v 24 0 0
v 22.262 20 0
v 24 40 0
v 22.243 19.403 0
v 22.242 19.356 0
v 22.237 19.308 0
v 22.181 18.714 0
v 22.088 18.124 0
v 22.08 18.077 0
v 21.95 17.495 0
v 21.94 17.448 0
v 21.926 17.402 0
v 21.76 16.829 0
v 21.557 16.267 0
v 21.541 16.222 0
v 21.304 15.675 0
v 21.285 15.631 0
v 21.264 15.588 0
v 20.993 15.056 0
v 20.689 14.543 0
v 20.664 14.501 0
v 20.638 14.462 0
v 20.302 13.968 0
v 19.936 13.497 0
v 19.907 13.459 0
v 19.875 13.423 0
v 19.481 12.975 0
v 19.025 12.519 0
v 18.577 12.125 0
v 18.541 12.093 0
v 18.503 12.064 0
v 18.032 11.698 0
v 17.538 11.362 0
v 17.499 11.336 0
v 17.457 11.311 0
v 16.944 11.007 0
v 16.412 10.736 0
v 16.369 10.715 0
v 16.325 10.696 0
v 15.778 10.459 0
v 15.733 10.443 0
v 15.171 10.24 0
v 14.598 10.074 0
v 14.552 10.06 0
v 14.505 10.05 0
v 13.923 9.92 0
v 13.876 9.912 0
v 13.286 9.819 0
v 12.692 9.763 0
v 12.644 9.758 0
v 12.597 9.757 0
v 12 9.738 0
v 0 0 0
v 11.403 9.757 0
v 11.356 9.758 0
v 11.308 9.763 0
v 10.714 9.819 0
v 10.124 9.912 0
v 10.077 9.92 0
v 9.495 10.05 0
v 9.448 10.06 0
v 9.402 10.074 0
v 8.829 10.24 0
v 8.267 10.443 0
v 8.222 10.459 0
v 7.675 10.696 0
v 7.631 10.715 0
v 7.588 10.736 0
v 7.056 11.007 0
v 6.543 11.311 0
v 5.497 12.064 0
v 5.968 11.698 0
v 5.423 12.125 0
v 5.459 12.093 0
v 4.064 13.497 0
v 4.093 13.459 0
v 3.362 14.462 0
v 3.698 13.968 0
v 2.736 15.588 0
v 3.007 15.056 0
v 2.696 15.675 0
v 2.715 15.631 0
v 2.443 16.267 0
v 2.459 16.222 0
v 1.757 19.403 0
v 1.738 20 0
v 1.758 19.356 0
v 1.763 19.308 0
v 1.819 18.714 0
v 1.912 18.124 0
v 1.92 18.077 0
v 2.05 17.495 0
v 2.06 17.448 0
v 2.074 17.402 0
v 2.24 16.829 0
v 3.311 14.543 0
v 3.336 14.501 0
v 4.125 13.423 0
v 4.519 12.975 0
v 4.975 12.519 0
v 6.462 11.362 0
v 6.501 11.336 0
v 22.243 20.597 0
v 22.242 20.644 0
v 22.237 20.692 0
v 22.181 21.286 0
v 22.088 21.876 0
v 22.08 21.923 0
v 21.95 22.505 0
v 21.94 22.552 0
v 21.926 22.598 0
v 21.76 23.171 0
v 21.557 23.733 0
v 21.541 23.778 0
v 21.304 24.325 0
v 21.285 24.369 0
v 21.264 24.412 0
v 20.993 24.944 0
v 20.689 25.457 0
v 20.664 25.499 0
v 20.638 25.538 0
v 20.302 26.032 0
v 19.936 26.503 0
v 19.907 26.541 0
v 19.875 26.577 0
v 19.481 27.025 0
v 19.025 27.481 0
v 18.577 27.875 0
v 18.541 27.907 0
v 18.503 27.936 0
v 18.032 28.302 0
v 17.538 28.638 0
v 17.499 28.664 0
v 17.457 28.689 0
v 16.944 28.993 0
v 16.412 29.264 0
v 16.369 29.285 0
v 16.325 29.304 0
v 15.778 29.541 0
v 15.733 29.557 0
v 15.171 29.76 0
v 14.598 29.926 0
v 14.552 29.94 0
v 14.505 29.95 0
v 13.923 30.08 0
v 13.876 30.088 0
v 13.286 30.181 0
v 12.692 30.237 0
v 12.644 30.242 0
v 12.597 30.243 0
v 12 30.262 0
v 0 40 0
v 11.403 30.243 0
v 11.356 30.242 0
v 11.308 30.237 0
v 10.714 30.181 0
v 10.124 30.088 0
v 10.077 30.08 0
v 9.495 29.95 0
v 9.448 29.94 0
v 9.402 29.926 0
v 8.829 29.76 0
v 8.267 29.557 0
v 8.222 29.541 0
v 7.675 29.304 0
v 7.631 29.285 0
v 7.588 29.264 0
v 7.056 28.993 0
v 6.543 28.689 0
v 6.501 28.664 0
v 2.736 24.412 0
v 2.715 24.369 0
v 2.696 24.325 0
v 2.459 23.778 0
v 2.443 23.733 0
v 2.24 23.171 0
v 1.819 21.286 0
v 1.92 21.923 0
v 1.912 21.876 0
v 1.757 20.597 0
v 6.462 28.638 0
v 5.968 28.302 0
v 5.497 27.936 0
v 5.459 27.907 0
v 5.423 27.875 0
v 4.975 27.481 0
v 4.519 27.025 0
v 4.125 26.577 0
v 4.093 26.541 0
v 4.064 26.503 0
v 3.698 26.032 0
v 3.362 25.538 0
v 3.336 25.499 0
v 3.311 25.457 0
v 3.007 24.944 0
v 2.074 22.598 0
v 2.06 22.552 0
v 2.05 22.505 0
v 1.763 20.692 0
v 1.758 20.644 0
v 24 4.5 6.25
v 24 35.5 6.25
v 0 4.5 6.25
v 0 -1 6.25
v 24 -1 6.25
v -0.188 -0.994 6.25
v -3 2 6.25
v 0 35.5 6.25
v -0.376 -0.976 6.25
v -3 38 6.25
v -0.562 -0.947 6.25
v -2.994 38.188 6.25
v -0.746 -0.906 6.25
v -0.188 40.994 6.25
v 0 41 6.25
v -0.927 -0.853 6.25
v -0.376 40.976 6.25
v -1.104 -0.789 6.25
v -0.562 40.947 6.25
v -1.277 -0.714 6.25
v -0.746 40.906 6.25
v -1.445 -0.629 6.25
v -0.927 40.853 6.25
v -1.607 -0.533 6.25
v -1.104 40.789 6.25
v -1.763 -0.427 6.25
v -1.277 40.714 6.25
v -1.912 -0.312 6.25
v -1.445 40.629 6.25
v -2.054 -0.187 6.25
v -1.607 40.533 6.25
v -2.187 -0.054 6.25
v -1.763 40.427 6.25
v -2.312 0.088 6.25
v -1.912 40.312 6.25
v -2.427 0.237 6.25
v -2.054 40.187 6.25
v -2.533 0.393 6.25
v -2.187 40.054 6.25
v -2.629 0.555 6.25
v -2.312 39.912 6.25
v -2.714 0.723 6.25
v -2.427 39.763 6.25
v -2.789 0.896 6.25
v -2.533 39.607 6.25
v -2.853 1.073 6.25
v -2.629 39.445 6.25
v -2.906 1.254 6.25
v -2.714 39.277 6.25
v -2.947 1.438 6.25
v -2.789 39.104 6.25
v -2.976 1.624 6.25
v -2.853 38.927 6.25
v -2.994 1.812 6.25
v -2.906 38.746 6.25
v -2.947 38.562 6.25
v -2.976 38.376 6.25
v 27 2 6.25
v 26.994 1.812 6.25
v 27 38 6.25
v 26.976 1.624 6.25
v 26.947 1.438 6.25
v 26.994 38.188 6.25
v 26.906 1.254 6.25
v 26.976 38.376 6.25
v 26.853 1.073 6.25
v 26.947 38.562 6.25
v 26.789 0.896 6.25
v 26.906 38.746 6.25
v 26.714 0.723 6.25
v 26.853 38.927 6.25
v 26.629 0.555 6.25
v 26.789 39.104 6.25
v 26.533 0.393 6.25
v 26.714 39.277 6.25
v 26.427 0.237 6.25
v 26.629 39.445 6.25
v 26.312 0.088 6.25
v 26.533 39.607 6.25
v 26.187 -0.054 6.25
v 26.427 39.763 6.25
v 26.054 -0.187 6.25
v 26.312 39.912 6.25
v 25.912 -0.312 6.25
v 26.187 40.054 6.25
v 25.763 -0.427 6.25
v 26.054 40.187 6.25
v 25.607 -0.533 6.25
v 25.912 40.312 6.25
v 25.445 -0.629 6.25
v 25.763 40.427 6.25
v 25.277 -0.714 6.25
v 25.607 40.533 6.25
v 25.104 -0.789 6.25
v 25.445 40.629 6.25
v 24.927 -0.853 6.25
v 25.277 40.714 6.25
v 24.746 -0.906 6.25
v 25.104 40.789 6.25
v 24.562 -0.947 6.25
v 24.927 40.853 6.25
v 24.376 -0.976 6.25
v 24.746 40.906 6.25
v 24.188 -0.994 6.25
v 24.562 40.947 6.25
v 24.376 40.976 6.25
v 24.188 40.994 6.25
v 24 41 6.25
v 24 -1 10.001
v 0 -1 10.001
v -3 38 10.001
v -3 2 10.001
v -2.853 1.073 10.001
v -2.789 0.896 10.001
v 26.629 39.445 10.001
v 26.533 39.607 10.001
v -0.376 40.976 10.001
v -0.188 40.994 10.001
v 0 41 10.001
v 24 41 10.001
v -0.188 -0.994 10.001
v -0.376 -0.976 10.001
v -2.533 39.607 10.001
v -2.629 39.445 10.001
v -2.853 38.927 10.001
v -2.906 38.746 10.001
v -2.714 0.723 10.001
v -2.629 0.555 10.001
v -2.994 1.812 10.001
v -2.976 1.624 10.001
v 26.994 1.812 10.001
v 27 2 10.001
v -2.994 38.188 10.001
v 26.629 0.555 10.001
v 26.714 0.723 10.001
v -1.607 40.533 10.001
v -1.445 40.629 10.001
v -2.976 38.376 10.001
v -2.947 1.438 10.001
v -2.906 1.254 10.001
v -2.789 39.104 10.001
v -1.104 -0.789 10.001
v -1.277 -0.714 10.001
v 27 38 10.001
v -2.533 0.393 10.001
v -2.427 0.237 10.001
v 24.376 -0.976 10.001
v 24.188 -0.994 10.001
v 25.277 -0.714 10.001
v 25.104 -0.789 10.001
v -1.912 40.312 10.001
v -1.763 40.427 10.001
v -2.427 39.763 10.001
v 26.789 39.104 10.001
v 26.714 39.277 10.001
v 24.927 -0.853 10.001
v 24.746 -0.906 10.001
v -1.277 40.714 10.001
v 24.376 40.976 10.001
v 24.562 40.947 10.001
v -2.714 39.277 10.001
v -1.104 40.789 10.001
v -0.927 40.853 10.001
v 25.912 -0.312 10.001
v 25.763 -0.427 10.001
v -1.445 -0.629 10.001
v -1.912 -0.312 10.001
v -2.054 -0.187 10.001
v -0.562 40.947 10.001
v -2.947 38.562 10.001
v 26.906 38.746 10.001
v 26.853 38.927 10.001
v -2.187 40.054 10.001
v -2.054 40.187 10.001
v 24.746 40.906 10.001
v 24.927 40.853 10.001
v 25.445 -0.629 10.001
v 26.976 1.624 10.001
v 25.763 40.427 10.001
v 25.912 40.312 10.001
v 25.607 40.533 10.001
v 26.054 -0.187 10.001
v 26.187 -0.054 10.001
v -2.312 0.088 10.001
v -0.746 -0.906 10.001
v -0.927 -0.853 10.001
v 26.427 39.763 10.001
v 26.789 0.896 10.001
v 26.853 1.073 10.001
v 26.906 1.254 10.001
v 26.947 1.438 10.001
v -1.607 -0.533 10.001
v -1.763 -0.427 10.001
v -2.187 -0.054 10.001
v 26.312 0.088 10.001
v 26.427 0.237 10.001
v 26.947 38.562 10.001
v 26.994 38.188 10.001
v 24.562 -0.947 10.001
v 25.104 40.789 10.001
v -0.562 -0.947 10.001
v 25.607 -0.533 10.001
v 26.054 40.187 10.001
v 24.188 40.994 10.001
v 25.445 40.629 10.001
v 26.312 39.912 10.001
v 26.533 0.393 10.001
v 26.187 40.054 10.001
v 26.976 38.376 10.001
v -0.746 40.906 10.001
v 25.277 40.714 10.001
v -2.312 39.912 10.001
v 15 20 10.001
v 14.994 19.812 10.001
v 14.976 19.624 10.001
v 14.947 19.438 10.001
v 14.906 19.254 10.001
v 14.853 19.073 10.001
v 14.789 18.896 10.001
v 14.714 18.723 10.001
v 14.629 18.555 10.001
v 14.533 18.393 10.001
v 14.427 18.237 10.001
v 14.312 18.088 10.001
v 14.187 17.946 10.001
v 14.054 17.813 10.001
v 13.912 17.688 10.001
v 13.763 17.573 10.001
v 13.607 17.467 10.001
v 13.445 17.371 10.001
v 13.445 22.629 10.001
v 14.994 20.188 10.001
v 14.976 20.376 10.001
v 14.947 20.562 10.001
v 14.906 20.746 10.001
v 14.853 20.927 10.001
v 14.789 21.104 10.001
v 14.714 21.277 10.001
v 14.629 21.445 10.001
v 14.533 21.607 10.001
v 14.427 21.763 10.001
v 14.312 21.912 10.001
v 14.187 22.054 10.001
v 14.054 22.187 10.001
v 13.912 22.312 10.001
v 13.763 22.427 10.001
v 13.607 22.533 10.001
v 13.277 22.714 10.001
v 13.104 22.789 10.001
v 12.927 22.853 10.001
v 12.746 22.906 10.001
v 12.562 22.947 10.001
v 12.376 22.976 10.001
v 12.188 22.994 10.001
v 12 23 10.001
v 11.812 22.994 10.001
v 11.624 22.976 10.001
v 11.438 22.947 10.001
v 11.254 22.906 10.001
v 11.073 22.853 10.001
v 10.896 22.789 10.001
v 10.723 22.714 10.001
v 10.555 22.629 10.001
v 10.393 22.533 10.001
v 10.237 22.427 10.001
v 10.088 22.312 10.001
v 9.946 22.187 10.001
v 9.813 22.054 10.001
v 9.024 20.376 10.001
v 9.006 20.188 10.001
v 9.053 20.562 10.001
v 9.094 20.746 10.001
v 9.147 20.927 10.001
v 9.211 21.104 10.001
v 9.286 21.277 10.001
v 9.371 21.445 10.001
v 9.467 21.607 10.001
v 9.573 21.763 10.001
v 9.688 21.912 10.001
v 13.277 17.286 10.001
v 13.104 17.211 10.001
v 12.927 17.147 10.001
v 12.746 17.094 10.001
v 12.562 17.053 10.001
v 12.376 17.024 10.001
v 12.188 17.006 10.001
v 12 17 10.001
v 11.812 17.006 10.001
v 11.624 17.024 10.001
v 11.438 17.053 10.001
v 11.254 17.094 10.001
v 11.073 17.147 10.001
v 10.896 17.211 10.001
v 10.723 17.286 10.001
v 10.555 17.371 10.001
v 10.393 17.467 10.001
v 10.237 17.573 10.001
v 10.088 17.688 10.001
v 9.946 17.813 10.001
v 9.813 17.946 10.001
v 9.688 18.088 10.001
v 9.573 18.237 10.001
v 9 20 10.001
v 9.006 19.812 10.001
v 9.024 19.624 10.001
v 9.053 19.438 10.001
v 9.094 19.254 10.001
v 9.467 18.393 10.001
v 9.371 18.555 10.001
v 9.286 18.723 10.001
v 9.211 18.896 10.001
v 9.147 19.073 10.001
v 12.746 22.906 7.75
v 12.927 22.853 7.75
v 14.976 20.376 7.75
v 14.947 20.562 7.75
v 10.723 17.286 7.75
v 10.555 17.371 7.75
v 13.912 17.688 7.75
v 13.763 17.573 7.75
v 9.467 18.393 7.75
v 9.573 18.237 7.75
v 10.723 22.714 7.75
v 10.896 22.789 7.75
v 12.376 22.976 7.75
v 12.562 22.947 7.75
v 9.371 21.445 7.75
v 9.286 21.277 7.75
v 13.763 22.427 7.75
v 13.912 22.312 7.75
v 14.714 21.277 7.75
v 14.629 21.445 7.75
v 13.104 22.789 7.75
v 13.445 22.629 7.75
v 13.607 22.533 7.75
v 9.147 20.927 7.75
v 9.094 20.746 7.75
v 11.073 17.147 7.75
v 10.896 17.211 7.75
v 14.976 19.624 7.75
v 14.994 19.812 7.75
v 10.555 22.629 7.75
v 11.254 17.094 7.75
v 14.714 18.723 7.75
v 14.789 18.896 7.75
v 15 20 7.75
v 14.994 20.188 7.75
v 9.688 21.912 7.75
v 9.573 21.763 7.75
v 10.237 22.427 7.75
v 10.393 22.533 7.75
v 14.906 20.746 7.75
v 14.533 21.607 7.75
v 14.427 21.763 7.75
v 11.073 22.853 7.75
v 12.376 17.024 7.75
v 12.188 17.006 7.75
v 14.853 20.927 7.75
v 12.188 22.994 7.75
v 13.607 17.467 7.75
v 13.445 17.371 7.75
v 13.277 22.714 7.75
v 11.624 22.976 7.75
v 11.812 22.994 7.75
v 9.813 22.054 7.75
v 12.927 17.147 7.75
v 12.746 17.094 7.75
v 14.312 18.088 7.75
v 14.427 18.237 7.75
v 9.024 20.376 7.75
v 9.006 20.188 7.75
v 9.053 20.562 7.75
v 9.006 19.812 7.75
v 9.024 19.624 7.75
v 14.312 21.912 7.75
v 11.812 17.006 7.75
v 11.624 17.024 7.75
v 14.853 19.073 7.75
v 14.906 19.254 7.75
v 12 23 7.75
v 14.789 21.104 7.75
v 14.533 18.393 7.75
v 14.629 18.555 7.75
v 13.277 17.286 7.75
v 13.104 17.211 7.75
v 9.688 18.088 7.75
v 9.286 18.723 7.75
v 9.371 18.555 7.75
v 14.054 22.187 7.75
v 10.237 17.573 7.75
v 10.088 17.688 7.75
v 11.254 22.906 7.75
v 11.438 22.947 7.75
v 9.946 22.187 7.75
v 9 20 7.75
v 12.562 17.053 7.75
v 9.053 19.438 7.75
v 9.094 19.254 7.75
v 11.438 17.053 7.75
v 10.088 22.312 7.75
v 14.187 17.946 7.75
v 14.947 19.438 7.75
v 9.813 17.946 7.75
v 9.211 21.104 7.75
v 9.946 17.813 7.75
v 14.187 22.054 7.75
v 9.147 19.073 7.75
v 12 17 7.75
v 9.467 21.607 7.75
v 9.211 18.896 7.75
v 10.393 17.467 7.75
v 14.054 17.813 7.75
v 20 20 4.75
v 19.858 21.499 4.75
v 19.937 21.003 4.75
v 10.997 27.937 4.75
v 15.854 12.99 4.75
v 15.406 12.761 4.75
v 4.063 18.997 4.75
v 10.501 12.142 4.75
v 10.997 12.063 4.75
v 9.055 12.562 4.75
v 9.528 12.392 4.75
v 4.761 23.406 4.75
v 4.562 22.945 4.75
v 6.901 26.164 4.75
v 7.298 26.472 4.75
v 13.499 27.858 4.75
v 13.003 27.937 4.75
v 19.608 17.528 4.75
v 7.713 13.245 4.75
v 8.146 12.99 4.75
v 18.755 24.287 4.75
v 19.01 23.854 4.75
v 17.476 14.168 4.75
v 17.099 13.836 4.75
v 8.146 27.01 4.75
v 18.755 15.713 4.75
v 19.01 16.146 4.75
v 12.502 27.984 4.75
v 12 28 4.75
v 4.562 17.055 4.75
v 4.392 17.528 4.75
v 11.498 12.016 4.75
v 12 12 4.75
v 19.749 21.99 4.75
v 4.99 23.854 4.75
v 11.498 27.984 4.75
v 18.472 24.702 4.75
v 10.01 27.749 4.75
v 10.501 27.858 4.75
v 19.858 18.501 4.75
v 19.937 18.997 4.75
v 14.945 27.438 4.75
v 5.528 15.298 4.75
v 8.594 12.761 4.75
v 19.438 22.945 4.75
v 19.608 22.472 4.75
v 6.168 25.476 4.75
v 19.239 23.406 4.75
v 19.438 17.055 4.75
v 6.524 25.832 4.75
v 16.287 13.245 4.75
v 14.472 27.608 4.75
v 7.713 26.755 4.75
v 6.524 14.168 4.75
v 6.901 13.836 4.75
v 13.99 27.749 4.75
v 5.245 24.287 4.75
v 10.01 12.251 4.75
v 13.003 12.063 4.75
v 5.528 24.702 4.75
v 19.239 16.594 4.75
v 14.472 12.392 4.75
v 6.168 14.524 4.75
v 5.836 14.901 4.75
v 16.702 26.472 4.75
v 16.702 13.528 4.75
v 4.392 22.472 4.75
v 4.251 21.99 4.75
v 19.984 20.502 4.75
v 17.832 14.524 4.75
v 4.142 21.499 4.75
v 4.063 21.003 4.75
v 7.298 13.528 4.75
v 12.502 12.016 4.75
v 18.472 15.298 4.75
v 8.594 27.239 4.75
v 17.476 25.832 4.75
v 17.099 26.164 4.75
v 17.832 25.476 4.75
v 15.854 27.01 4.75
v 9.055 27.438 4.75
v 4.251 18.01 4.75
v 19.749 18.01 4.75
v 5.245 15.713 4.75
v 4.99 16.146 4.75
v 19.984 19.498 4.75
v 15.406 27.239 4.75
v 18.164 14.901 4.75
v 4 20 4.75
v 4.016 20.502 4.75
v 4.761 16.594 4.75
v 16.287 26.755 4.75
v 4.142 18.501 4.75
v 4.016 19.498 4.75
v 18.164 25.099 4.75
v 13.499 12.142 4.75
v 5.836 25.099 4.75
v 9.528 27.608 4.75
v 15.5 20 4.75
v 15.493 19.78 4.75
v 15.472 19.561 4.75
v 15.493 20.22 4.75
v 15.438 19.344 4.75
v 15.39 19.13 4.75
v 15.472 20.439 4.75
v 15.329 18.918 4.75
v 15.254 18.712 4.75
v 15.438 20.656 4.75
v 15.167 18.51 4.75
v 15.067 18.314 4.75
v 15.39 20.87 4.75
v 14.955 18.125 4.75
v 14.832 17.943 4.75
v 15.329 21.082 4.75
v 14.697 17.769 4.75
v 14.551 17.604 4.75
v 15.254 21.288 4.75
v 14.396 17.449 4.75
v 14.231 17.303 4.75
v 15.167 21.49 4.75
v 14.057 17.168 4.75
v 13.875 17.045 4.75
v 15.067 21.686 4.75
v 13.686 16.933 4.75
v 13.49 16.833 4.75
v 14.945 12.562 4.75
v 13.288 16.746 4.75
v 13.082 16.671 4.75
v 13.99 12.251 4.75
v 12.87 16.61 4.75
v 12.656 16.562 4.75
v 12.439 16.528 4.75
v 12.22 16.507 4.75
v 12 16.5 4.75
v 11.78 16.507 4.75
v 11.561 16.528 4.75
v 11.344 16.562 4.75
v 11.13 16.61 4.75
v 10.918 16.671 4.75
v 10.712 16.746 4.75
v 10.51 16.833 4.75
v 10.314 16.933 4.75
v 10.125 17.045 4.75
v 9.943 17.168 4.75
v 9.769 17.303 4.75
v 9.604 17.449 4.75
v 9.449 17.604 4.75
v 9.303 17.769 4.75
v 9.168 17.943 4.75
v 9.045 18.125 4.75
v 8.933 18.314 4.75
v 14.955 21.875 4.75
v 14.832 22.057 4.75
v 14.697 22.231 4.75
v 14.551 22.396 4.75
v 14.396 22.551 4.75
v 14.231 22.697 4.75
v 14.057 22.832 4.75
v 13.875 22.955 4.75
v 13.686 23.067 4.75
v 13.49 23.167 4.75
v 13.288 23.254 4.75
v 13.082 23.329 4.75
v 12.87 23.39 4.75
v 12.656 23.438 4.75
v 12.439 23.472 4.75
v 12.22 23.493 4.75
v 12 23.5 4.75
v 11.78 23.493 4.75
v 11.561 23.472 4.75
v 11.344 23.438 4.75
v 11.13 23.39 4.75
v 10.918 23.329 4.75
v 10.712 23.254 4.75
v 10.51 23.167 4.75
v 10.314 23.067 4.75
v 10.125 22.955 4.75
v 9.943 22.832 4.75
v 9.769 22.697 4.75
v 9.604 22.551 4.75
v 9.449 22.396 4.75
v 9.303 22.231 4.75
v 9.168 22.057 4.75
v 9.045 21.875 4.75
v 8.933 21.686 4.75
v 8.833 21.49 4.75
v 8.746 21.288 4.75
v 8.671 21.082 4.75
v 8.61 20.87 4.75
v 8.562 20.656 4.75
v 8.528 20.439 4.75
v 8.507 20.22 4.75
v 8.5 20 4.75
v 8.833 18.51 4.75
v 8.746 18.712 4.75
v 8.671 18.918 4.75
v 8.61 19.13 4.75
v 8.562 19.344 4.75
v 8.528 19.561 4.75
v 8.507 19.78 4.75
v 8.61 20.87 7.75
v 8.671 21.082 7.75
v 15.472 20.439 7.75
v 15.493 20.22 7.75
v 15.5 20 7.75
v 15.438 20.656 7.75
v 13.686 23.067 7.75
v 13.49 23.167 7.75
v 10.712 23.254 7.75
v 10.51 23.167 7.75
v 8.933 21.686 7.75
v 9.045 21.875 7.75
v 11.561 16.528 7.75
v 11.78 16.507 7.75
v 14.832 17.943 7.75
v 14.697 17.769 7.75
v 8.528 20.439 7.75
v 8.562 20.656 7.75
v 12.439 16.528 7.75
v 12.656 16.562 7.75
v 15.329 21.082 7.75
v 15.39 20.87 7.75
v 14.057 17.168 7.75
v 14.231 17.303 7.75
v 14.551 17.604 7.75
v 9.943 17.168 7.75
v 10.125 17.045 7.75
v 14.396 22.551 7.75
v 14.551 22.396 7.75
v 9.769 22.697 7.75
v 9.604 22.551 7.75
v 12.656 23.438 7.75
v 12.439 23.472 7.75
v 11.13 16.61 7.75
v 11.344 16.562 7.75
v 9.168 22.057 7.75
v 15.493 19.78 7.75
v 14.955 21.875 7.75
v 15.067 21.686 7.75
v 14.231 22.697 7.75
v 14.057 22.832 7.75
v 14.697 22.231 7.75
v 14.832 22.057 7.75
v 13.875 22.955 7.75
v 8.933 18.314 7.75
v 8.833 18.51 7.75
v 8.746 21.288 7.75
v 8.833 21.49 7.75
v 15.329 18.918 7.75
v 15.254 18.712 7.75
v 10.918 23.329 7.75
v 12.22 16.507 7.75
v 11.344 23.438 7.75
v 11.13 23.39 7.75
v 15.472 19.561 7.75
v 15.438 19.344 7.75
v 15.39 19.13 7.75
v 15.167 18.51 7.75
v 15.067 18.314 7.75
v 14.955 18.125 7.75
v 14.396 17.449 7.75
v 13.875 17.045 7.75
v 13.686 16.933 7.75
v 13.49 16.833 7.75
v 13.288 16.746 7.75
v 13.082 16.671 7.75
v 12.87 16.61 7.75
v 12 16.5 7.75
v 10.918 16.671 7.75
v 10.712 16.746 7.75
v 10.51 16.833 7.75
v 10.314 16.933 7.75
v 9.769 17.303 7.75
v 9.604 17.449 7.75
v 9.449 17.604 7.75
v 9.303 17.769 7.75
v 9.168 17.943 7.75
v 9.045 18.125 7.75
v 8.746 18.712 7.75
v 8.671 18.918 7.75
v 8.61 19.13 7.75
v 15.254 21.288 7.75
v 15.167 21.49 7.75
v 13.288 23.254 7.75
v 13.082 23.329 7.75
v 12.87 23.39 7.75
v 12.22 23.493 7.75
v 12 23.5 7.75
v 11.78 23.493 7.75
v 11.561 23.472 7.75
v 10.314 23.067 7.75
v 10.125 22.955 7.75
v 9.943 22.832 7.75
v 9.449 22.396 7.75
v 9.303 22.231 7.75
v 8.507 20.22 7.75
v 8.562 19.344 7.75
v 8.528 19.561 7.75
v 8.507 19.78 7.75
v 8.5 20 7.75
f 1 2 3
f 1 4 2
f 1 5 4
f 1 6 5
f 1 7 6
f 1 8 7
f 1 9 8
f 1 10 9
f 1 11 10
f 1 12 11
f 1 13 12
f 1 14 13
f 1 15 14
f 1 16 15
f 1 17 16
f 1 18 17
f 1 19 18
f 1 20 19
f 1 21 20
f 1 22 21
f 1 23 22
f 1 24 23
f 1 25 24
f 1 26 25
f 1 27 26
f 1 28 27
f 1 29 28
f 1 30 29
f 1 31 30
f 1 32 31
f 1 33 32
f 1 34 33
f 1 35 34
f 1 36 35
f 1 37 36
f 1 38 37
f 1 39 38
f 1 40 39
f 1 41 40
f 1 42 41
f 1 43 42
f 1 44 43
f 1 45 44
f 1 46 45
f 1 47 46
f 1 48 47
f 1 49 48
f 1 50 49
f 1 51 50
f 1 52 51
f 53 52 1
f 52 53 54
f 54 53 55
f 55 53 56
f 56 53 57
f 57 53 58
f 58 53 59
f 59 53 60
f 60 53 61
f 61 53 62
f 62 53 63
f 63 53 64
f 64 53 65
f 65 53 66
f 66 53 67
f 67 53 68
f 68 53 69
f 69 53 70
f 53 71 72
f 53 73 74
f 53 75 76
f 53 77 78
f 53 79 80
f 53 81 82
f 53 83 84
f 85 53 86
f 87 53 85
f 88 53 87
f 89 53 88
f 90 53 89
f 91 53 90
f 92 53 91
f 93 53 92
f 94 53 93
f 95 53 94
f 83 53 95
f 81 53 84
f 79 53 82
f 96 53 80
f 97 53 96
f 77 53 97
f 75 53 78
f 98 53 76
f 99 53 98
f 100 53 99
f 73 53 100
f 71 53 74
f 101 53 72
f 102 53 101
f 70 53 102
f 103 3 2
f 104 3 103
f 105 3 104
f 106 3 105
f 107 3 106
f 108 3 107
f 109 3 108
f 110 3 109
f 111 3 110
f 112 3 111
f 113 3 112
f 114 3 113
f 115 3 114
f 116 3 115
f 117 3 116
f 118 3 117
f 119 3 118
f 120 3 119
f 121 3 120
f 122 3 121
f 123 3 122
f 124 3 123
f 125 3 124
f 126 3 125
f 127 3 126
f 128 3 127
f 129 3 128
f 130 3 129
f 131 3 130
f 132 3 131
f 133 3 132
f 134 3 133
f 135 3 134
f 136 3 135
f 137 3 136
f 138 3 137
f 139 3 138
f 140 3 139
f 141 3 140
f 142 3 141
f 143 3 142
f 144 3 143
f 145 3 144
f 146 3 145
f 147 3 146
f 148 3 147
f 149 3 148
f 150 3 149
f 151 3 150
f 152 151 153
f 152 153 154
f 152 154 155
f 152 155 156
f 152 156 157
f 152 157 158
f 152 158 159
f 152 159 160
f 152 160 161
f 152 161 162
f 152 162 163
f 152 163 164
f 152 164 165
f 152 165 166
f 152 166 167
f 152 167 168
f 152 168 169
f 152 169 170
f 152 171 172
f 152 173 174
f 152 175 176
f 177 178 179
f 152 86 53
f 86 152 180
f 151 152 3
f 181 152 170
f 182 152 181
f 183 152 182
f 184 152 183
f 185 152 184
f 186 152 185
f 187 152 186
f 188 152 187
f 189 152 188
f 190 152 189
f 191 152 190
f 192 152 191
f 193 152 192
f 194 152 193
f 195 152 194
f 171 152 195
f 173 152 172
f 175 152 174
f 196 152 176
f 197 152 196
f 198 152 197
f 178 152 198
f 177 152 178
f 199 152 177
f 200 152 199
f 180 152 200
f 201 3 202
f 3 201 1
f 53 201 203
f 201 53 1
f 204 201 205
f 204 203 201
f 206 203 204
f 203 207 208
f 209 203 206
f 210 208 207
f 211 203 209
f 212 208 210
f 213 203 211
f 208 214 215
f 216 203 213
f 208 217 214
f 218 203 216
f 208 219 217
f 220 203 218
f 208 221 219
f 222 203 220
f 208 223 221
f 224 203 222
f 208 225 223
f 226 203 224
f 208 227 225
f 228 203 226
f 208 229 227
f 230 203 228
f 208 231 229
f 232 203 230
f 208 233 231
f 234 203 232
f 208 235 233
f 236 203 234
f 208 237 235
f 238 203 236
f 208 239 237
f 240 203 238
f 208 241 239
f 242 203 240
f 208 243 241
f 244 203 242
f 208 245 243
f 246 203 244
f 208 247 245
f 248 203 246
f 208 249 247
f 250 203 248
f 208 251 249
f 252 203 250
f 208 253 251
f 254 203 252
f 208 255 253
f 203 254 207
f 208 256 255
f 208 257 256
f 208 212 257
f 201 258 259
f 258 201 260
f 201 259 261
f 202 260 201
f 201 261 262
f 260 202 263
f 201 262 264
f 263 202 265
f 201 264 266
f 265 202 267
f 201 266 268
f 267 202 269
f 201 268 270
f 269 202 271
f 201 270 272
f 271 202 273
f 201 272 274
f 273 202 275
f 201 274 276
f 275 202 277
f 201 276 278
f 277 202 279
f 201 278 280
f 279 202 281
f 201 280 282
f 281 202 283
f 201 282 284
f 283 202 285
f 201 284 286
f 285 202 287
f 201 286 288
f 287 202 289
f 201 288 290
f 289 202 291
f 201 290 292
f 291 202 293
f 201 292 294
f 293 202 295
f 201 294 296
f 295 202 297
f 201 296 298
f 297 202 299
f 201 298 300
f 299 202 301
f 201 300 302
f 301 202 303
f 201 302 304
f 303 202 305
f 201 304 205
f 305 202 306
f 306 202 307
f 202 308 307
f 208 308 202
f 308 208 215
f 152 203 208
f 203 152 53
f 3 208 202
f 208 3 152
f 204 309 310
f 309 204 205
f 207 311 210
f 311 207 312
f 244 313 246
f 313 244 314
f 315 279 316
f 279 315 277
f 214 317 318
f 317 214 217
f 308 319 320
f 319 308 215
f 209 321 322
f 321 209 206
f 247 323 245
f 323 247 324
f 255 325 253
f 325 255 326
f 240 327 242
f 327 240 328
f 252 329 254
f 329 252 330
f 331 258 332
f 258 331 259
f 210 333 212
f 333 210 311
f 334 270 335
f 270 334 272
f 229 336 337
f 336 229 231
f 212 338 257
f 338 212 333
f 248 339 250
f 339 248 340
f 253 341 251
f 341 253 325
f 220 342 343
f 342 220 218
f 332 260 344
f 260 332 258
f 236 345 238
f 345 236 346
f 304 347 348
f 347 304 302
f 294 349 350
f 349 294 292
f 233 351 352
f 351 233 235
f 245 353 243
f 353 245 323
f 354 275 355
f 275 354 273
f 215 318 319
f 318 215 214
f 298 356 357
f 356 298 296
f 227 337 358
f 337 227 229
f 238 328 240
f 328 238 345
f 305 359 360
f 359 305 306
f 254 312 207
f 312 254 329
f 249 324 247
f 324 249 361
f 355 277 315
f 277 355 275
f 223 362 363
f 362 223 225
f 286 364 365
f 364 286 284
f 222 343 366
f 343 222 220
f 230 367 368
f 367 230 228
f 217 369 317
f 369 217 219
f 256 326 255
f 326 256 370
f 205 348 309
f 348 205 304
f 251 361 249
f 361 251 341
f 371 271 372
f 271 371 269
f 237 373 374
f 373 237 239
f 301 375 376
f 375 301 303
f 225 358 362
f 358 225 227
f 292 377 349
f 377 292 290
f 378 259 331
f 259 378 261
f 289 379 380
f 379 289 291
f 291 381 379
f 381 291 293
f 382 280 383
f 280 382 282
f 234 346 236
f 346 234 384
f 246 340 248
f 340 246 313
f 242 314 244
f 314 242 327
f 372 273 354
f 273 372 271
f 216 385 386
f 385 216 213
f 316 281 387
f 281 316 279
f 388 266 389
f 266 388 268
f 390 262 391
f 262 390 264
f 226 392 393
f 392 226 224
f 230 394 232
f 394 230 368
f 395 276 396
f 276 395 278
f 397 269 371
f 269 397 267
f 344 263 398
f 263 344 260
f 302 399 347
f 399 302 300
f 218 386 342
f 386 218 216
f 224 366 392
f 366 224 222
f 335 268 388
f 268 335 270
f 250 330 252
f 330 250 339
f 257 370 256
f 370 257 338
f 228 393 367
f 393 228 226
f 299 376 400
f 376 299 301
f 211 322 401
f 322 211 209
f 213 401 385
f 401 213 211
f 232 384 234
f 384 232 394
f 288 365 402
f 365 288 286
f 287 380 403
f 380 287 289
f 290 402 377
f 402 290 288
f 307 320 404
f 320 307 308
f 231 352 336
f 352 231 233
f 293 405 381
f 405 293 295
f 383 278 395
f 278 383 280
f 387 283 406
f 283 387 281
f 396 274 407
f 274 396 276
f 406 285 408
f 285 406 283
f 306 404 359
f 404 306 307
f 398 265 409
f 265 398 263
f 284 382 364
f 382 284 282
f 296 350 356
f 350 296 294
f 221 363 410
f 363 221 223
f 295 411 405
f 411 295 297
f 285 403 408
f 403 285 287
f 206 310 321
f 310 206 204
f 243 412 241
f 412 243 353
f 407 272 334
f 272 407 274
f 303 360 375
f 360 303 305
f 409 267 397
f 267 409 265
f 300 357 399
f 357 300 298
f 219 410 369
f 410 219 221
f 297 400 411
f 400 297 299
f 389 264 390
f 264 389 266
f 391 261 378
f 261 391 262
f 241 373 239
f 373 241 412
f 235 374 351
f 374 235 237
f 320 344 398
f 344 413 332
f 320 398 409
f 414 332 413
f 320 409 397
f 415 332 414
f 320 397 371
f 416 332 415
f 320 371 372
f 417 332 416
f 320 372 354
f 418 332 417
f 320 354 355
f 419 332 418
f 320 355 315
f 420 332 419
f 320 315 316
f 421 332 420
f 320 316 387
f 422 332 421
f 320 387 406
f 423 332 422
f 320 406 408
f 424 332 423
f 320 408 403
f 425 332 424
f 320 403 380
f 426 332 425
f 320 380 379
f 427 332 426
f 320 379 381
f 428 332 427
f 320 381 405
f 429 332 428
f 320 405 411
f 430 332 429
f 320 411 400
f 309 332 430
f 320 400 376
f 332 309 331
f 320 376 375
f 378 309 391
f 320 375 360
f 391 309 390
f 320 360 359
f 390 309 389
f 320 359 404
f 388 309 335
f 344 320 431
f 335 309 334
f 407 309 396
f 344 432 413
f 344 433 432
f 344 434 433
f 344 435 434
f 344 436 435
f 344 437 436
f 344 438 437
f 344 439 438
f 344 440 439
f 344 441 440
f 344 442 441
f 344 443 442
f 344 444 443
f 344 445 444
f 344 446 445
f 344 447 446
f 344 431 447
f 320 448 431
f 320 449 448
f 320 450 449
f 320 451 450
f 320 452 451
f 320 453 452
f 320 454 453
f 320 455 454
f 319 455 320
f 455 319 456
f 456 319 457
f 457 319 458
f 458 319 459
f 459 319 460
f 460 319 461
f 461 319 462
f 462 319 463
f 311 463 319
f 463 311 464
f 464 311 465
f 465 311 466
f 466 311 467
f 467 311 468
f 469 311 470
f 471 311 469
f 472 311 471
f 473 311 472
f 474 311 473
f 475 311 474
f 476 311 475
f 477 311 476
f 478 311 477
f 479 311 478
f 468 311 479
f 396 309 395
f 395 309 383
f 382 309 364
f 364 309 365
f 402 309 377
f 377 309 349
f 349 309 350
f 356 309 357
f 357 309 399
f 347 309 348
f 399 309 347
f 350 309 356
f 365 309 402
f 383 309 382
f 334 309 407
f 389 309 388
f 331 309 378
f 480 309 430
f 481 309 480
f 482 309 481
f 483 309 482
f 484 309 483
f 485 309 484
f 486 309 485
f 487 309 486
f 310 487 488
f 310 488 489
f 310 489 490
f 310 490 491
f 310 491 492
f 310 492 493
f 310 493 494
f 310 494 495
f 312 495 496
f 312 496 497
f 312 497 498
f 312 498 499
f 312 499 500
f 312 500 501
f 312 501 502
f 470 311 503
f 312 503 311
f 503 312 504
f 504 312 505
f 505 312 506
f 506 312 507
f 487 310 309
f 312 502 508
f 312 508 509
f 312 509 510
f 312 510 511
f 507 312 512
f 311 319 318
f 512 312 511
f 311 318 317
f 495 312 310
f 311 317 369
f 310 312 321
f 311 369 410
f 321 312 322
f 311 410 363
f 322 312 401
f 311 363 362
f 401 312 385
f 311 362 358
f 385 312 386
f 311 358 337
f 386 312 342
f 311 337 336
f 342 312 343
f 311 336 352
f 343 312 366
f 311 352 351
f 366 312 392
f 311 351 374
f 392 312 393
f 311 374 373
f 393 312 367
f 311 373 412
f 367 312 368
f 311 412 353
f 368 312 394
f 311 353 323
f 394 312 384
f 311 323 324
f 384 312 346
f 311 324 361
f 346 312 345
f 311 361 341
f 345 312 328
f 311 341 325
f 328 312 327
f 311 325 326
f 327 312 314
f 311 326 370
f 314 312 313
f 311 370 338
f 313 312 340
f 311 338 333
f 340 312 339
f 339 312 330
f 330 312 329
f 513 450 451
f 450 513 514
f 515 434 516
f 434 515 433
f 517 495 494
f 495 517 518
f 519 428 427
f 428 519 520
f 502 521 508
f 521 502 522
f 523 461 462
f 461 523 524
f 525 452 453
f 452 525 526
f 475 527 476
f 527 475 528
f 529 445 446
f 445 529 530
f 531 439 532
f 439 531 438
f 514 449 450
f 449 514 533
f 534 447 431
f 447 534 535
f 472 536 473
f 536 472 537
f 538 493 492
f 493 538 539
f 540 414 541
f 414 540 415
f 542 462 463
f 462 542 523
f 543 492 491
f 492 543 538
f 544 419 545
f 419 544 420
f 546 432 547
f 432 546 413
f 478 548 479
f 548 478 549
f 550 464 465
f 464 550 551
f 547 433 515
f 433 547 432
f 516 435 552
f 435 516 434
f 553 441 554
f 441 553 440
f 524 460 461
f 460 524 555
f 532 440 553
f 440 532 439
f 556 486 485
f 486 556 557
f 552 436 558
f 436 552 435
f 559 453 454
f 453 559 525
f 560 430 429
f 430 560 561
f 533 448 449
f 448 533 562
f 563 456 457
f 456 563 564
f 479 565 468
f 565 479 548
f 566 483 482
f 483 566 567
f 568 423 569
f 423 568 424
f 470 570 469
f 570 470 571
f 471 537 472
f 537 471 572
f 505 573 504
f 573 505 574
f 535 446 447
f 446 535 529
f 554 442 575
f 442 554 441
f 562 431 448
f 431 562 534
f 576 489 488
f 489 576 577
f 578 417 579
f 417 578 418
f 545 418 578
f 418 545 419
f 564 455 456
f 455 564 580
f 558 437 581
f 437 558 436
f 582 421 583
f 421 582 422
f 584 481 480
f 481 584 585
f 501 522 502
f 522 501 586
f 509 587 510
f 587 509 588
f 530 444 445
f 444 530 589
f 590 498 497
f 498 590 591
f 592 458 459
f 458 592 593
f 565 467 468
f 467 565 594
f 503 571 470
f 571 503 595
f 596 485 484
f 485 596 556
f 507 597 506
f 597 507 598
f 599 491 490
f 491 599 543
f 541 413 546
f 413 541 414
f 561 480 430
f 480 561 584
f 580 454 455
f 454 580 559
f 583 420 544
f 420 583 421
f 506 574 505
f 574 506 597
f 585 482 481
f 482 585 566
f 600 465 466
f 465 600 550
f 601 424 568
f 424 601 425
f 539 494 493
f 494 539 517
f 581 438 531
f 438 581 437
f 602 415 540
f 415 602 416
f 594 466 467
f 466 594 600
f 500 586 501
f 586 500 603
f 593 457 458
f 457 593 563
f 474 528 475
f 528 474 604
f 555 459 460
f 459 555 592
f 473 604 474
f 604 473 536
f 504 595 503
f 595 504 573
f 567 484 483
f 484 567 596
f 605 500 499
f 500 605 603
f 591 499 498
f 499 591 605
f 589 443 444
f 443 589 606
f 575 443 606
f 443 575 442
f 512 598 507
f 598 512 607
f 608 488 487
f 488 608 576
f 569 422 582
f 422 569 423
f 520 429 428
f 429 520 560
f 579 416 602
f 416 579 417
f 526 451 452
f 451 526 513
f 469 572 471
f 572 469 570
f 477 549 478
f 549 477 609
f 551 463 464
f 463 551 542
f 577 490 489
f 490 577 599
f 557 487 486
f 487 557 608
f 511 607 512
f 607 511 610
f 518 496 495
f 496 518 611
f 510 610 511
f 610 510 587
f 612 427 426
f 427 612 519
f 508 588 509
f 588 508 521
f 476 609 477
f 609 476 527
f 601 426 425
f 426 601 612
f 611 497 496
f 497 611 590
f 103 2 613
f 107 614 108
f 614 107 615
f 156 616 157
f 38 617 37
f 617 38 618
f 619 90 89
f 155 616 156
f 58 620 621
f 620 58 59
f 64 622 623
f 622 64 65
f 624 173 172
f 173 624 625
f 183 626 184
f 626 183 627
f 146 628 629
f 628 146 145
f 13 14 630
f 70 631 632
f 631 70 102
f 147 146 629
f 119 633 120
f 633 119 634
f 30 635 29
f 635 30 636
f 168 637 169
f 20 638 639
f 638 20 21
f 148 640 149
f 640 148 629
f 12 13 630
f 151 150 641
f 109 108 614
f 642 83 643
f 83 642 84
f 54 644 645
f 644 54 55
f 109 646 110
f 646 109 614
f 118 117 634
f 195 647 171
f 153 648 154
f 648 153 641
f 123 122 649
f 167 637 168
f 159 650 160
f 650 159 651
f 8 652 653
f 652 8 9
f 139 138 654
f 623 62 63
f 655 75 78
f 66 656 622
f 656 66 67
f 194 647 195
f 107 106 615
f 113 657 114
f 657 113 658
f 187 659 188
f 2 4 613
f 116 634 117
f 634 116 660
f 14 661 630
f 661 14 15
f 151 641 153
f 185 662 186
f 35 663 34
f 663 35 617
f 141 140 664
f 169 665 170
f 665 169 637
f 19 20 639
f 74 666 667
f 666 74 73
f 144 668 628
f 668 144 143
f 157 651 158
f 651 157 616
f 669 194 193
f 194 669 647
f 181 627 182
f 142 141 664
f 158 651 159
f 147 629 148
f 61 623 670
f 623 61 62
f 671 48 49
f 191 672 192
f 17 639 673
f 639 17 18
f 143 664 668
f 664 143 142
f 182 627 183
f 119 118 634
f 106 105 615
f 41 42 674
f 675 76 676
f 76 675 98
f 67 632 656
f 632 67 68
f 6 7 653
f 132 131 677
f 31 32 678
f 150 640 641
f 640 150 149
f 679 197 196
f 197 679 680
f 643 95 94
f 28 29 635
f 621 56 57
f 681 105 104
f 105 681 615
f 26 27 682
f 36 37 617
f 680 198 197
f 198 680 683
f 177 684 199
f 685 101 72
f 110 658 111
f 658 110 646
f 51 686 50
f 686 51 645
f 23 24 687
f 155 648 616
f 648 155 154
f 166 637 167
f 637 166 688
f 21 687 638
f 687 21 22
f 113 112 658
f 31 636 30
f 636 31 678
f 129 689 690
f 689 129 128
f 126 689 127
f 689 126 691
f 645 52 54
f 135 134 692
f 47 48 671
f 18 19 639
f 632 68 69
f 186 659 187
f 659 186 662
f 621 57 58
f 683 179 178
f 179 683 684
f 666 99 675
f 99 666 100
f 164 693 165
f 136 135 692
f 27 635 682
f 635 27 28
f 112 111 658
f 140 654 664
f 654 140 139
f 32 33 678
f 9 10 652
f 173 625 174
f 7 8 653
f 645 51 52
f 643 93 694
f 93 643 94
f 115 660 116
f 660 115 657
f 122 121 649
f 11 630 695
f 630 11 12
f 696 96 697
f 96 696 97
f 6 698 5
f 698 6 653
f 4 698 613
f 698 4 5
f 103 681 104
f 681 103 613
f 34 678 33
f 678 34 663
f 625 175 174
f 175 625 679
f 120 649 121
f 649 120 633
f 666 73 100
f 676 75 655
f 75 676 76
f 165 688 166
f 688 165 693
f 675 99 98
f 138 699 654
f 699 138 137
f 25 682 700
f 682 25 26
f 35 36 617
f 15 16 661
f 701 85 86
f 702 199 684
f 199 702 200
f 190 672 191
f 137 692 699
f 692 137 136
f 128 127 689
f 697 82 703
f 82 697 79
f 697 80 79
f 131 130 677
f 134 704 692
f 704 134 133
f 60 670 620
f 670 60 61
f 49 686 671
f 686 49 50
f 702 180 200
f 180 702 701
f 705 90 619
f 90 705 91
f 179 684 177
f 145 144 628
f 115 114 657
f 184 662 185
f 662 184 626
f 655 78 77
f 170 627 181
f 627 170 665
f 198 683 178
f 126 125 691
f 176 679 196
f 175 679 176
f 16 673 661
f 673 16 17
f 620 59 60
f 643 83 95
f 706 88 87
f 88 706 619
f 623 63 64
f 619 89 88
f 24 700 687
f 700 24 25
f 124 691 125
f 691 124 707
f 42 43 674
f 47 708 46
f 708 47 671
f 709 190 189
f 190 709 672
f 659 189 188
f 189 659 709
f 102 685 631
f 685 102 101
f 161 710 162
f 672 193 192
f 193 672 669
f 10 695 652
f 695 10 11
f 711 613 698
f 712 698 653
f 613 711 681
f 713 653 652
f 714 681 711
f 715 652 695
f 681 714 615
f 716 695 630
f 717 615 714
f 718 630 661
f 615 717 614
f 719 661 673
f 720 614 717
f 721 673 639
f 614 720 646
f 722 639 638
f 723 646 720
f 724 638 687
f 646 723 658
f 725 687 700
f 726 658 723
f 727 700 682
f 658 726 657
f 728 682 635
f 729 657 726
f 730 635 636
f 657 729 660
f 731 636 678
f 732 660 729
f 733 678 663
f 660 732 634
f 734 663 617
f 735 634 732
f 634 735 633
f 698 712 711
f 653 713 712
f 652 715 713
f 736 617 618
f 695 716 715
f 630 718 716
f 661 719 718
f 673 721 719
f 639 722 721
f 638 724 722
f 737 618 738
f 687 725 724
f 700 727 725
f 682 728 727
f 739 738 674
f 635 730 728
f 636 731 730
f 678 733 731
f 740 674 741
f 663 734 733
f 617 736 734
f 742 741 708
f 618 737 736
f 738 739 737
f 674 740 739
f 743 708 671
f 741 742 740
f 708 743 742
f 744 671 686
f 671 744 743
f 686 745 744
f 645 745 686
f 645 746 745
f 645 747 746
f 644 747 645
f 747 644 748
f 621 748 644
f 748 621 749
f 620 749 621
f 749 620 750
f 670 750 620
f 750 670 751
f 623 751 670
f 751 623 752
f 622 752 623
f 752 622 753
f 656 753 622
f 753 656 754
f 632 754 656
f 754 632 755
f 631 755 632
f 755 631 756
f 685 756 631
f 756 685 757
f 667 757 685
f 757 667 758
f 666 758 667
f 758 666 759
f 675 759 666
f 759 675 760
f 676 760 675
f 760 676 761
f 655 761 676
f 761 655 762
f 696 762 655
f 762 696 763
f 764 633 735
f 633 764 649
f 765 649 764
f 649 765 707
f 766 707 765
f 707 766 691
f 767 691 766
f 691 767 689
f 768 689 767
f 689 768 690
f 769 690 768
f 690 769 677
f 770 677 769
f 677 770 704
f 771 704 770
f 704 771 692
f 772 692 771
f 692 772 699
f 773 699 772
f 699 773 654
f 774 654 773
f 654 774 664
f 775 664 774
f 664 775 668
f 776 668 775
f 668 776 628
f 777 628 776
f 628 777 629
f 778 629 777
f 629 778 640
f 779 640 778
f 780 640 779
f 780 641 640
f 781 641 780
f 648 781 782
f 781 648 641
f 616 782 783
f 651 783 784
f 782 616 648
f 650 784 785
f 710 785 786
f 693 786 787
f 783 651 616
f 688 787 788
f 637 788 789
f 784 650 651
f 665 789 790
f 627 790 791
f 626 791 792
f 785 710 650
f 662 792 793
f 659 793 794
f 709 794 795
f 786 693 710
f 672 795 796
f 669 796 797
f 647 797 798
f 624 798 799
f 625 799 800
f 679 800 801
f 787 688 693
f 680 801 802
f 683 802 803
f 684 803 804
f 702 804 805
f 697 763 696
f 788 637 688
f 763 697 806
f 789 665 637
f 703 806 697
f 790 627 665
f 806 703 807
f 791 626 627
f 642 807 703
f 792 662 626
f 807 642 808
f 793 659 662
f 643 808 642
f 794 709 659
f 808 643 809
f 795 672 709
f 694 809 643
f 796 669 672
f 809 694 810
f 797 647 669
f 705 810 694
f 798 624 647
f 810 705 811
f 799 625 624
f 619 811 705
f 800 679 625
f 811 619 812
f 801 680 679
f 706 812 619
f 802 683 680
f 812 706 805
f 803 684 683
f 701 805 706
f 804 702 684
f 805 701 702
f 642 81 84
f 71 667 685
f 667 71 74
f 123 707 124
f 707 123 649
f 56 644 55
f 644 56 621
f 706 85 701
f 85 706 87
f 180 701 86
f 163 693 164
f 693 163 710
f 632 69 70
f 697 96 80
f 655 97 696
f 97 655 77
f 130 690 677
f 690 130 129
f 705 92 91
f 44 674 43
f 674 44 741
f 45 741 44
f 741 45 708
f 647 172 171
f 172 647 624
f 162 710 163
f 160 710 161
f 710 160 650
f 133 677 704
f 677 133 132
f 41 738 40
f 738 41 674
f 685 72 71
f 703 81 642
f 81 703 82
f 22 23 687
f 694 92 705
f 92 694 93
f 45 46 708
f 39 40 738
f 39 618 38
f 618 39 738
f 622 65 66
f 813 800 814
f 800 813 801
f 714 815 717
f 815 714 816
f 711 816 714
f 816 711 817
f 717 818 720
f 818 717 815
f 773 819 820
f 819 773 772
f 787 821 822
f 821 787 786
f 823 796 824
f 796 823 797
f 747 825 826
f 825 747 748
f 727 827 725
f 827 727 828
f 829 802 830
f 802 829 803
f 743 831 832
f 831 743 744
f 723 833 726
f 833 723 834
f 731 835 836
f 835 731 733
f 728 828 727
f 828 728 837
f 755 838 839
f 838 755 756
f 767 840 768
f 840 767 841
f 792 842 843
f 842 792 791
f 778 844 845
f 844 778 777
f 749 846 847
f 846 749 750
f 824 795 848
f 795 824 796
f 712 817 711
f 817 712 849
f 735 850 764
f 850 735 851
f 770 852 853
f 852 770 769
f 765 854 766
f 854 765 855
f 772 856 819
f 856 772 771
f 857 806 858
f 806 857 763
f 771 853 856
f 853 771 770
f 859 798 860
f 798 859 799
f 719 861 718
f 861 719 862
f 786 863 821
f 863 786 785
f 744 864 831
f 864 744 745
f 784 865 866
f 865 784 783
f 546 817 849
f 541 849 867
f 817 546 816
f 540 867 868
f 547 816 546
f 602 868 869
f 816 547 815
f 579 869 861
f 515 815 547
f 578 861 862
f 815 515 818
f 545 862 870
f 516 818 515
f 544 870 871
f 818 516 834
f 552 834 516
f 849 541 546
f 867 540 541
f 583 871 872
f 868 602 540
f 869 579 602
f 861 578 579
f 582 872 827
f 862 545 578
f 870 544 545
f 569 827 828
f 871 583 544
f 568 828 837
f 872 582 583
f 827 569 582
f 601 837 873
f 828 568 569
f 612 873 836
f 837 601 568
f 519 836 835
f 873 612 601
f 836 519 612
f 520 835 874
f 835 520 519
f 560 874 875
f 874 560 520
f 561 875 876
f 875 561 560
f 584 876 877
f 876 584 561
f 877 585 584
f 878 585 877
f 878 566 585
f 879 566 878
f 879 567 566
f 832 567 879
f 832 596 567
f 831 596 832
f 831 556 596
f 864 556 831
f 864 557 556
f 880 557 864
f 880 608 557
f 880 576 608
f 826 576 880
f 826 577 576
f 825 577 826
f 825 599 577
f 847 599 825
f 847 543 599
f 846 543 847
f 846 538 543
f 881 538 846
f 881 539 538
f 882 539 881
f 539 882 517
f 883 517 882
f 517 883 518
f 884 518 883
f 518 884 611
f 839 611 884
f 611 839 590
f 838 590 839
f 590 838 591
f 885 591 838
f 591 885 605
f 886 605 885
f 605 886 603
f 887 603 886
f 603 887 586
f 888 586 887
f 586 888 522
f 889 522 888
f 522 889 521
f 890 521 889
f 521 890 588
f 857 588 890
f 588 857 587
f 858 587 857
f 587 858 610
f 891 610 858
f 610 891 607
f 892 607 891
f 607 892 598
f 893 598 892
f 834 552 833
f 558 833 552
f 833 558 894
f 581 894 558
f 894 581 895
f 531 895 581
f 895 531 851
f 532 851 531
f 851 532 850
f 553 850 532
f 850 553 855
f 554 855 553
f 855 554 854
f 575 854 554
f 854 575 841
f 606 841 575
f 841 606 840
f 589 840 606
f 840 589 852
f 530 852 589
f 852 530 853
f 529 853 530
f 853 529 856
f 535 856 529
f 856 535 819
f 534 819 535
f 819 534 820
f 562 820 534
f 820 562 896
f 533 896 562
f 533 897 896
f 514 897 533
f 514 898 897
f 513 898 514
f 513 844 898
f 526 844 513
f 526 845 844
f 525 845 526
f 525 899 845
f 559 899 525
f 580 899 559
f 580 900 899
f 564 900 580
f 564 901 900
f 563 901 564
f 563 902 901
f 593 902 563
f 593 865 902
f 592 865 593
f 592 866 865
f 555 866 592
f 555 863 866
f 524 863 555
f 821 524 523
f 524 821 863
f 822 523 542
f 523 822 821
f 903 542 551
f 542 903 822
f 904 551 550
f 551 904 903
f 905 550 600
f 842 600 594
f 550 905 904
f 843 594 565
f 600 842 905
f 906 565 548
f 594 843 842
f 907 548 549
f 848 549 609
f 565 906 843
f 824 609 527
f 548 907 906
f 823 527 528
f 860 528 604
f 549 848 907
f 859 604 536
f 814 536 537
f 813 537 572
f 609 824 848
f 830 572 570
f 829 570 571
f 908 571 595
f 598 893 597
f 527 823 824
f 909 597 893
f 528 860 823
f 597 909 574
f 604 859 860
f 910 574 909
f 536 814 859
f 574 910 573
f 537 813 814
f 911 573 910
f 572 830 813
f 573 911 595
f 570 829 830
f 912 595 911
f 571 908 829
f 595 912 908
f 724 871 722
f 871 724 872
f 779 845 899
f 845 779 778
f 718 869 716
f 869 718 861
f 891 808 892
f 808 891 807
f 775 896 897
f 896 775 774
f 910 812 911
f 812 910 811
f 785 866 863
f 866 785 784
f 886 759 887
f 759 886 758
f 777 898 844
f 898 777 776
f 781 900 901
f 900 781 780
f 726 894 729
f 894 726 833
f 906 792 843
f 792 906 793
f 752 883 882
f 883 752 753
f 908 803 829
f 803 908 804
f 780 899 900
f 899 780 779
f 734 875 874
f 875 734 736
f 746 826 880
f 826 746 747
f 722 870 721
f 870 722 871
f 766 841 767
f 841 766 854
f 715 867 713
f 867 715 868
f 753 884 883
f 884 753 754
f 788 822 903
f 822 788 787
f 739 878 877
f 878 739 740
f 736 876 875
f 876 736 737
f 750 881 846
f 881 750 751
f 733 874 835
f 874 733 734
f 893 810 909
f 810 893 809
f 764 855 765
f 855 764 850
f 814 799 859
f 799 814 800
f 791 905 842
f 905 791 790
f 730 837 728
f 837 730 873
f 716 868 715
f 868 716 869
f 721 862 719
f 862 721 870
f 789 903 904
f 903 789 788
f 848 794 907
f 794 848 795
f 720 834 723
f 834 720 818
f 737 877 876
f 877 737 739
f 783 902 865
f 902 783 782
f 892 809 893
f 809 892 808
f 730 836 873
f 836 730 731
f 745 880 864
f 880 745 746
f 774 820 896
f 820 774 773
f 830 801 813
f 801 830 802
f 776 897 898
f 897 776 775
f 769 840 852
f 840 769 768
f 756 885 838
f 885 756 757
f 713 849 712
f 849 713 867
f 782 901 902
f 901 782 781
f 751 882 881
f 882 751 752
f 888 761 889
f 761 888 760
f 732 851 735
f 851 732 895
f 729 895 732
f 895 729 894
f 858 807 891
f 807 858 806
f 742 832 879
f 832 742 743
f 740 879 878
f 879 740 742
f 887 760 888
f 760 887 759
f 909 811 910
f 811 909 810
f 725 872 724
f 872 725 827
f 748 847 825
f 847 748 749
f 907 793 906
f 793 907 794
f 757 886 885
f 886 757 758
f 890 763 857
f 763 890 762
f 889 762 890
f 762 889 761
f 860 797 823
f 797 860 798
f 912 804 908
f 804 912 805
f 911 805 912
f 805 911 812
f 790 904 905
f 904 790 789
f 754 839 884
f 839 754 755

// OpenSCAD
translate (0,0,0);
Laenge_Fuss_unten = 40;
Laenge_Fuss_oben = 31;
Versatz = (Laenge_Fuss_unten - Laenge_Fuss_oben)/2;
Gesamtdicke = 10;
Breite_Fuss = 24;
Dicke_Fuss = 6.25;
Breite_Oberteil = 30;
Laenge_Oberteil = 42;
Dicke_Oberteil = Gesamtdicke - Dicke_Fuss;
Rand_gerade = (Breite_Fuss - Breite_Oberteil)/2;
Rand_schraeg = (Laenge_Fuss_oben - Laenge_Oberteil)/2;
Kerbenbreite = 0;
Kerbenlaenge = 0;
Kerbentiefe = 0;
$fn=50 + 50;
module schuh (){
    CubePoints = [
  [  0,  0,  0 ],  //0
  [ Breite_Fuss,  0,  0 ],  //1
  [ Breite_Fuss,  Laenge_Fuss_unten,  0 ],  //2
  [  0,  Laenge_Fuss_unten,  0 ],  //3
  [  0,  Versatz,  Dicke_Fuss ],  //4
  [ Breite_Fuss,  Versatz, Dicke_Fuss ],  //5
  [ Breite_Fuss,  Versatz + Laenge_Fuss_oben , Dicke_Fuss],  //6
  [  0, Versatz + Laenge_Fuss_oben , Dicke_Fuss]]; //7
  
CubeFaces = [
  [0,1,2,3],  // bottom
  [4,5,1,0],  // front
  [7,6,5,4],  // top
  [5,6,2,1],  // right
  [6,7,3,2],  // back
  [7,4,0,3]]; // left
polyhedron( CubePoints, CubeFaces);
};

module platte() {
   minkowski () {
        cube([Breite_Oberteil-6 , Laenge_Oberteil-6, Dicke_Oberteil]);
        translate ([3,3,0])cylinder(r=3,0.001);
    }
}

module Adapter_voll() {schuh();
translate ([Rand_gerade, Rand_schraeg+Versatz, Dicke_Fuss])
platte();
}
difference()
{
Adapter_voll();
translate([Breite_Fuss/2, Laenge_Fuss_unten/2,-0.5]) cylinder(r=3,Gesamtdicke+1);
translate([Breite_Fuss/2, Laenge_Fuss_unten/2,-0.5]) cylinder(r1=10.5, r2=8,(Dicke_Fuss-1));
translate([Breite_Fuss/2, Laenge_Fuss_unten/2,-0.5]) cylinder(r=3.5,Dicke_Fuss+2);    
  
translate([0,0,Dicke_Fuss-Kerbentiefe]) cube([Kerbenbreite,Kerbenlaenge,Kerbentiefe]);
translate([Breite_Fuss-Kerbenbreite,0,Dicke_Fuss-Kerbentiefe]) cube([Kerbenbreite,Kerbenlaenge,Kerbentiefe]);    
}
